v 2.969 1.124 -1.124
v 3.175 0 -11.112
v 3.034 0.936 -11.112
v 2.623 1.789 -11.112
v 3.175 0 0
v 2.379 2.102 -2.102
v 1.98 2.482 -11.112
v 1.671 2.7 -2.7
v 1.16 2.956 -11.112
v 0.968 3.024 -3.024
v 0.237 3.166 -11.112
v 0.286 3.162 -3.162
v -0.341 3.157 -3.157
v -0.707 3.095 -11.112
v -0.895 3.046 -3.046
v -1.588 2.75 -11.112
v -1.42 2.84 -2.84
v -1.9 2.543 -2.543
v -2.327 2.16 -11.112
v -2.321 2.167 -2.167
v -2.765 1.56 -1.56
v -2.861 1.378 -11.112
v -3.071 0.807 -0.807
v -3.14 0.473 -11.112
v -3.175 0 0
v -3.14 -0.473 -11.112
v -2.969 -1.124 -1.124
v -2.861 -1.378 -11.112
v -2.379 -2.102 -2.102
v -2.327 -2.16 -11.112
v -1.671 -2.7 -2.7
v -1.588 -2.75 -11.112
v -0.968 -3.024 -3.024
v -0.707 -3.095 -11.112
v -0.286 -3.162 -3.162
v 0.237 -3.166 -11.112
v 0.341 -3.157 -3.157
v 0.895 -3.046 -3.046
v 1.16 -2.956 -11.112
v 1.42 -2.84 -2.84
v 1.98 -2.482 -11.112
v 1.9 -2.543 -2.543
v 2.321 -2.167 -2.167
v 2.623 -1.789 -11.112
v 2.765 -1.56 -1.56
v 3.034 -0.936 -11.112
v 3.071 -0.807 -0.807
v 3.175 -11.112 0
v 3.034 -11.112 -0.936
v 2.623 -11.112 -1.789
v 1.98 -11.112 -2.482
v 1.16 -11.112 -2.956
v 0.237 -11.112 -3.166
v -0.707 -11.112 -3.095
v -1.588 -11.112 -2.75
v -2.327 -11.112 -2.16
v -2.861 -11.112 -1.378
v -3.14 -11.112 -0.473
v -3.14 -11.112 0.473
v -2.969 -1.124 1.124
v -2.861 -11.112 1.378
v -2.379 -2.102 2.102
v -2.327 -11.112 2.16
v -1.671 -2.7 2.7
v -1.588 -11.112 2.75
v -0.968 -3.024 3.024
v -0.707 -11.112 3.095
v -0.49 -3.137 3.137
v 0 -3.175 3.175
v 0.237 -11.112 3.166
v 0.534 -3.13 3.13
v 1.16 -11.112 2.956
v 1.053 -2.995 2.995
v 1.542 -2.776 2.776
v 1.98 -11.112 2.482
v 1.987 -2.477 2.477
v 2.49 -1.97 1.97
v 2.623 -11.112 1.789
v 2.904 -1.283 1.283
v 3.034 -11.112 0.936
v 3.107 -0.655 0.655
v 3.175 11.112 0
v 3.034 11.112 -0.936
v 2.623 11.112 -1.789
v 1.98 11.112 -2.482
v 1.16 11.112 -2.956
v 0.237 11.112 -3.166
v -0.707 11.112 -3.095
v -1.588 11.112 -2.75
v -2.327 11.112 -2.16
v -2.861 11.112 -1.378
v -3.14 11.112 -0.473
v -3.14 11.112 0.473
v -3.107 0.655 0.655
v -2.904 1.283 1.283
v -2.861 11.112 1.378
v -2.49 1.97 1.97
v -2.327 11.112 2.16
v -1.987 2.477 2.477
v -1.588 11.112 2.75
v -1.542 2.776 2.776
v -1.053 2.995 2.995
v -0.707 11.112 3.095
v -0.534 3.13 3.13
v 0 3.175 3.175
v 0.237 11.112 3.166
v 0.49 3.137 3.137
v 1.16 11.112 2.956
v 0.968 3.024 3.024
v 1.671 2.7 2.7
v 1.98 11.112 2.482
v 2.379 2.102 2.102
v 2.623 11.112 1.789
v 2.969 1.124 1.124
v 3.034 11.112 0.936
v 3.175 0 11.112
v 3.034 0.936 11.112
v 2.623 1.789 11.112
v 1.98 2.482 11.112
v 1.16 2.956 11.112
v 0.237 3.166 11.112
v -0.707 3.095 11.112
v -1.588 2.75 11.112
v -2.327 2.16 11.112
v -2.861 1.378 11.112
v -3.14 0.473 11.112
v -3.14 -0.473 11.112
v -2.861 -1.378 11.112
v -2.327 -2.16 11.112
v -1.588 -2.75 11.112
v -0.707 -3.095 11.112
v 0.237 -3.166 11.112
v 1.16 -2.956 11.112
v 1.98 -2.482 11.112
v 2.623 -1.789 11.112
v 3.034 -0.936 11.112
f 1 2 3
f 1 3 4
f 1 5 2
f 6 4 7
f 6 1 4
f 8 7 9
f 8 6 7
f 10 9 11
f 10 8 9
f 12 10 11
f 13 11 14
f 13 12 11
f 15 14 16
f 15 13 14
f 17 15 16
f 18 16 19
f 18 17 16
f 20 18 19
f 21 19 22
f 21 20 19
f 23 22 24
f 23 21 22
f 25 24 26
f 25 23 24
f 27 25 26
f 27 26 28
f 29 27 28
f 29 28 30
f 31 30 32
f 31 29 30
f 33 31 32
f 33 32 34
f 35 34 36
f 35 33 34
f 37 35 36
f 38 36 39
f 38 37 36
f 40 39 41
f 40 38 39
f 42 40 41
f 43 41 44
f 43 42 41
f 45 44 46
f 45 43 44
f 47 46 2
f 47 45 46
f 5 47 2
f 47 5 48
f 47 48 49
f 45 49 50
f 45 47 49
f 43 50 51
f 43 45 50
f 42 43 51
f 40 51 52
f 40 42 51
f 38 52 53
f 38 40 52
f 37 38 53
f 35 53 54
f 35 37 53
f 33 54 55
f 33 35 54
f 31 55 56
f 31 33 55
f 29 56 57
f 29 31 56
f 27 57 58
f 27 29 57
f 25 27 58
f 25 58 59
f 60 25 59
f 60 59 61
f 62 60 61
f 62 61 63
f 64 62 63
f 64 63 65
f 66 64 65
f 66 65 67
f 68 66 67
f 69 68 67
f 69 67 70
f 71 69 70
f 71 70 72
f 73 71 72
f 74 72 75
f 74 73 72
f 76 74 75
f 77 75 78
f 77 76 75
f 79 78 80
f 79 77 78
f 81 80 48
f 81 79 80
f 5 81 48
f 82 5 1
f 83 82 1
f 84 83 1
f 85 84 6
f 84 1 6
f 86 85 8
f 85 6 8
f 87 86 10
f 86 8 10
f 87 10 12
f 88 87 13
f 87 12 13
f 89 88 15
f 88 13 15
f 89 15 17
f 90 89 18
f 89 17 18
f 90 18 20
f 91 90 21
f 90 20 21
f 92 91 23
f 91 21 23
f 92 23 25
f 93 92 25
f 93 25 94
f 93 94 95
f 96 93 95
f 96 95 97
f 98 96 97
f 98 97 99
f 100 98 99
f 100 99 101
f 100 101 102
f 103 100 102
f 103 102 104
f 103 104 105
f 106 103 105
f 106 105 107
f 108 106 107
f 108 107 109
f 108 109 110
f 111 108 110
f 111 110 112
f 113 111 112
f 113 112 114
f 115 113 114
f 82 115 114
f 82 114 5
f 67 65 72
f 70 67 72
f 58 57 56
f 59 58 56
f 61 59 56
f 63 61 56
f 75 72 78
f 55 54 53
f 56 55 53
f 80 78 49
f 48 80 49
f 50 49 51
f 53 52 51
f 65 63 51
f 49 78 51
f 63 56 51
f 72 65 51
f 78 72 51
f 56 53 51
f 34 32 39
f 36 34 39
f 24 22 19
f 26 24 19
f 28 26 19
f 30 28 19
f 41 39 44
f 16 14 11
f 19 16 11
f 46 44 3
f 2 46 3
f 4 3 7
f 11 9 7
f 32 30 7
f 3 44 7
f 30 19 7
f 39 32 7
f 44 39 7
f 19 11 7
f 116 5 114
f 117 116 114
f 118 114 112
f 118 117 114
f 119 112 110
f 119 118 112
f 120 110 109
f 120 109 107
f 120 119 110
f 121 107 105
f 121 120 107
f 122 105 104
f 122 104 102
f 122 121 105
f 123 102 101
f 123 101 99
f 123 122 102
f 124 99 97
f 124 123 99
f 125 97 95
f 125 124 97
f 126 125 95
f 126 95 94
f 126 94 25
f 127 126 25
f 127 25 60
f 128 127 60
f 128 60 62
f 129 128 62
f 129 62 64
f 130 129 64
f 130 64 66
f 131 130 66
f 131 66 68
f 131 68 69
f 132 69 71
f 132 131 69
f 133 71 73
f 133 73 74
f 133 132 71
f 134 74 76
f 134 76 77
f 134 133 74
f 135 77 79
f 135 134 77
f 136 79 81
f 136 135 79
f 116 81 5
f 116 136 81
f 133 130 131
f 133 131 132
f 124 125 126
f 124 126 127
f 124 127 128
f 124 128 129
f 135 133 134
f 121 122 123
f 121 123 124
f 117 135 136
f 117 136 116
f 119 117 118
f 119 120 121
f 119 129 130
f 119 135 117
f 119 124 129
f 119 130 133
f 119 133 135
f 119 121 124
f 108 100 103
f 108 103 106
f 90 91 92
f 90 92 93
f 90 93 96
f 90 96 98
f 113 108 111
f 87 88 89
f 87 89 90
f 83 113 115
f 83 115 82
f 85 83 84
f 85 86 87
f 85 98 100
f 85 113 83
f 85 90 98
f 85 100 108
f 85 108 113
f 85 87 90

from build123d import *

# Parameters (mm, degrees)
SKETCH1_R                = 3.175
BOSS_EXTRUDE1_DEPTH      = 11.1125
BOSS_EXTRUDE1_DEPTH_BACK = 11.1125
SKETCH2_R                = 3.175
BOSS_EXTRUDE2_DEPTH      = 11.1125
BOSS_EXTRUDE2_DEPTH_BACK = 11.1125


with BuildPart() as part:
    # Sketch1 → Boss-Extrude1 (new body, two sides)
    with BuildSketch(Plane.XY) as boss_extrude1_sk:
        Circle(SKETCH1_R)
    extrude(amount=BOSS_EXTRUDE1_DEPTH)
    extrude(boss_extrude1_sk.sketch, amount=-BOSS_EXTRUDE1_DEPTH_BACK)

    # Sketch2 → Boss-Extrude2 (add, two sides)
    with BuildSketch(Plane(origin=(0, 0, 0), x_dir=(1, 0, 0), z_dir=(0, 1, 0))) as boss_extrude2_sk:
        Circle(SKETCH2_R)
    extrude(amount=BOSS_EXTRUDE2_DEPTH)
    extrude(boss_extrude2_sk.sketch, amount=-BOSS_EXTRUDE2_DEPTH_BACK)


solid = part.part
